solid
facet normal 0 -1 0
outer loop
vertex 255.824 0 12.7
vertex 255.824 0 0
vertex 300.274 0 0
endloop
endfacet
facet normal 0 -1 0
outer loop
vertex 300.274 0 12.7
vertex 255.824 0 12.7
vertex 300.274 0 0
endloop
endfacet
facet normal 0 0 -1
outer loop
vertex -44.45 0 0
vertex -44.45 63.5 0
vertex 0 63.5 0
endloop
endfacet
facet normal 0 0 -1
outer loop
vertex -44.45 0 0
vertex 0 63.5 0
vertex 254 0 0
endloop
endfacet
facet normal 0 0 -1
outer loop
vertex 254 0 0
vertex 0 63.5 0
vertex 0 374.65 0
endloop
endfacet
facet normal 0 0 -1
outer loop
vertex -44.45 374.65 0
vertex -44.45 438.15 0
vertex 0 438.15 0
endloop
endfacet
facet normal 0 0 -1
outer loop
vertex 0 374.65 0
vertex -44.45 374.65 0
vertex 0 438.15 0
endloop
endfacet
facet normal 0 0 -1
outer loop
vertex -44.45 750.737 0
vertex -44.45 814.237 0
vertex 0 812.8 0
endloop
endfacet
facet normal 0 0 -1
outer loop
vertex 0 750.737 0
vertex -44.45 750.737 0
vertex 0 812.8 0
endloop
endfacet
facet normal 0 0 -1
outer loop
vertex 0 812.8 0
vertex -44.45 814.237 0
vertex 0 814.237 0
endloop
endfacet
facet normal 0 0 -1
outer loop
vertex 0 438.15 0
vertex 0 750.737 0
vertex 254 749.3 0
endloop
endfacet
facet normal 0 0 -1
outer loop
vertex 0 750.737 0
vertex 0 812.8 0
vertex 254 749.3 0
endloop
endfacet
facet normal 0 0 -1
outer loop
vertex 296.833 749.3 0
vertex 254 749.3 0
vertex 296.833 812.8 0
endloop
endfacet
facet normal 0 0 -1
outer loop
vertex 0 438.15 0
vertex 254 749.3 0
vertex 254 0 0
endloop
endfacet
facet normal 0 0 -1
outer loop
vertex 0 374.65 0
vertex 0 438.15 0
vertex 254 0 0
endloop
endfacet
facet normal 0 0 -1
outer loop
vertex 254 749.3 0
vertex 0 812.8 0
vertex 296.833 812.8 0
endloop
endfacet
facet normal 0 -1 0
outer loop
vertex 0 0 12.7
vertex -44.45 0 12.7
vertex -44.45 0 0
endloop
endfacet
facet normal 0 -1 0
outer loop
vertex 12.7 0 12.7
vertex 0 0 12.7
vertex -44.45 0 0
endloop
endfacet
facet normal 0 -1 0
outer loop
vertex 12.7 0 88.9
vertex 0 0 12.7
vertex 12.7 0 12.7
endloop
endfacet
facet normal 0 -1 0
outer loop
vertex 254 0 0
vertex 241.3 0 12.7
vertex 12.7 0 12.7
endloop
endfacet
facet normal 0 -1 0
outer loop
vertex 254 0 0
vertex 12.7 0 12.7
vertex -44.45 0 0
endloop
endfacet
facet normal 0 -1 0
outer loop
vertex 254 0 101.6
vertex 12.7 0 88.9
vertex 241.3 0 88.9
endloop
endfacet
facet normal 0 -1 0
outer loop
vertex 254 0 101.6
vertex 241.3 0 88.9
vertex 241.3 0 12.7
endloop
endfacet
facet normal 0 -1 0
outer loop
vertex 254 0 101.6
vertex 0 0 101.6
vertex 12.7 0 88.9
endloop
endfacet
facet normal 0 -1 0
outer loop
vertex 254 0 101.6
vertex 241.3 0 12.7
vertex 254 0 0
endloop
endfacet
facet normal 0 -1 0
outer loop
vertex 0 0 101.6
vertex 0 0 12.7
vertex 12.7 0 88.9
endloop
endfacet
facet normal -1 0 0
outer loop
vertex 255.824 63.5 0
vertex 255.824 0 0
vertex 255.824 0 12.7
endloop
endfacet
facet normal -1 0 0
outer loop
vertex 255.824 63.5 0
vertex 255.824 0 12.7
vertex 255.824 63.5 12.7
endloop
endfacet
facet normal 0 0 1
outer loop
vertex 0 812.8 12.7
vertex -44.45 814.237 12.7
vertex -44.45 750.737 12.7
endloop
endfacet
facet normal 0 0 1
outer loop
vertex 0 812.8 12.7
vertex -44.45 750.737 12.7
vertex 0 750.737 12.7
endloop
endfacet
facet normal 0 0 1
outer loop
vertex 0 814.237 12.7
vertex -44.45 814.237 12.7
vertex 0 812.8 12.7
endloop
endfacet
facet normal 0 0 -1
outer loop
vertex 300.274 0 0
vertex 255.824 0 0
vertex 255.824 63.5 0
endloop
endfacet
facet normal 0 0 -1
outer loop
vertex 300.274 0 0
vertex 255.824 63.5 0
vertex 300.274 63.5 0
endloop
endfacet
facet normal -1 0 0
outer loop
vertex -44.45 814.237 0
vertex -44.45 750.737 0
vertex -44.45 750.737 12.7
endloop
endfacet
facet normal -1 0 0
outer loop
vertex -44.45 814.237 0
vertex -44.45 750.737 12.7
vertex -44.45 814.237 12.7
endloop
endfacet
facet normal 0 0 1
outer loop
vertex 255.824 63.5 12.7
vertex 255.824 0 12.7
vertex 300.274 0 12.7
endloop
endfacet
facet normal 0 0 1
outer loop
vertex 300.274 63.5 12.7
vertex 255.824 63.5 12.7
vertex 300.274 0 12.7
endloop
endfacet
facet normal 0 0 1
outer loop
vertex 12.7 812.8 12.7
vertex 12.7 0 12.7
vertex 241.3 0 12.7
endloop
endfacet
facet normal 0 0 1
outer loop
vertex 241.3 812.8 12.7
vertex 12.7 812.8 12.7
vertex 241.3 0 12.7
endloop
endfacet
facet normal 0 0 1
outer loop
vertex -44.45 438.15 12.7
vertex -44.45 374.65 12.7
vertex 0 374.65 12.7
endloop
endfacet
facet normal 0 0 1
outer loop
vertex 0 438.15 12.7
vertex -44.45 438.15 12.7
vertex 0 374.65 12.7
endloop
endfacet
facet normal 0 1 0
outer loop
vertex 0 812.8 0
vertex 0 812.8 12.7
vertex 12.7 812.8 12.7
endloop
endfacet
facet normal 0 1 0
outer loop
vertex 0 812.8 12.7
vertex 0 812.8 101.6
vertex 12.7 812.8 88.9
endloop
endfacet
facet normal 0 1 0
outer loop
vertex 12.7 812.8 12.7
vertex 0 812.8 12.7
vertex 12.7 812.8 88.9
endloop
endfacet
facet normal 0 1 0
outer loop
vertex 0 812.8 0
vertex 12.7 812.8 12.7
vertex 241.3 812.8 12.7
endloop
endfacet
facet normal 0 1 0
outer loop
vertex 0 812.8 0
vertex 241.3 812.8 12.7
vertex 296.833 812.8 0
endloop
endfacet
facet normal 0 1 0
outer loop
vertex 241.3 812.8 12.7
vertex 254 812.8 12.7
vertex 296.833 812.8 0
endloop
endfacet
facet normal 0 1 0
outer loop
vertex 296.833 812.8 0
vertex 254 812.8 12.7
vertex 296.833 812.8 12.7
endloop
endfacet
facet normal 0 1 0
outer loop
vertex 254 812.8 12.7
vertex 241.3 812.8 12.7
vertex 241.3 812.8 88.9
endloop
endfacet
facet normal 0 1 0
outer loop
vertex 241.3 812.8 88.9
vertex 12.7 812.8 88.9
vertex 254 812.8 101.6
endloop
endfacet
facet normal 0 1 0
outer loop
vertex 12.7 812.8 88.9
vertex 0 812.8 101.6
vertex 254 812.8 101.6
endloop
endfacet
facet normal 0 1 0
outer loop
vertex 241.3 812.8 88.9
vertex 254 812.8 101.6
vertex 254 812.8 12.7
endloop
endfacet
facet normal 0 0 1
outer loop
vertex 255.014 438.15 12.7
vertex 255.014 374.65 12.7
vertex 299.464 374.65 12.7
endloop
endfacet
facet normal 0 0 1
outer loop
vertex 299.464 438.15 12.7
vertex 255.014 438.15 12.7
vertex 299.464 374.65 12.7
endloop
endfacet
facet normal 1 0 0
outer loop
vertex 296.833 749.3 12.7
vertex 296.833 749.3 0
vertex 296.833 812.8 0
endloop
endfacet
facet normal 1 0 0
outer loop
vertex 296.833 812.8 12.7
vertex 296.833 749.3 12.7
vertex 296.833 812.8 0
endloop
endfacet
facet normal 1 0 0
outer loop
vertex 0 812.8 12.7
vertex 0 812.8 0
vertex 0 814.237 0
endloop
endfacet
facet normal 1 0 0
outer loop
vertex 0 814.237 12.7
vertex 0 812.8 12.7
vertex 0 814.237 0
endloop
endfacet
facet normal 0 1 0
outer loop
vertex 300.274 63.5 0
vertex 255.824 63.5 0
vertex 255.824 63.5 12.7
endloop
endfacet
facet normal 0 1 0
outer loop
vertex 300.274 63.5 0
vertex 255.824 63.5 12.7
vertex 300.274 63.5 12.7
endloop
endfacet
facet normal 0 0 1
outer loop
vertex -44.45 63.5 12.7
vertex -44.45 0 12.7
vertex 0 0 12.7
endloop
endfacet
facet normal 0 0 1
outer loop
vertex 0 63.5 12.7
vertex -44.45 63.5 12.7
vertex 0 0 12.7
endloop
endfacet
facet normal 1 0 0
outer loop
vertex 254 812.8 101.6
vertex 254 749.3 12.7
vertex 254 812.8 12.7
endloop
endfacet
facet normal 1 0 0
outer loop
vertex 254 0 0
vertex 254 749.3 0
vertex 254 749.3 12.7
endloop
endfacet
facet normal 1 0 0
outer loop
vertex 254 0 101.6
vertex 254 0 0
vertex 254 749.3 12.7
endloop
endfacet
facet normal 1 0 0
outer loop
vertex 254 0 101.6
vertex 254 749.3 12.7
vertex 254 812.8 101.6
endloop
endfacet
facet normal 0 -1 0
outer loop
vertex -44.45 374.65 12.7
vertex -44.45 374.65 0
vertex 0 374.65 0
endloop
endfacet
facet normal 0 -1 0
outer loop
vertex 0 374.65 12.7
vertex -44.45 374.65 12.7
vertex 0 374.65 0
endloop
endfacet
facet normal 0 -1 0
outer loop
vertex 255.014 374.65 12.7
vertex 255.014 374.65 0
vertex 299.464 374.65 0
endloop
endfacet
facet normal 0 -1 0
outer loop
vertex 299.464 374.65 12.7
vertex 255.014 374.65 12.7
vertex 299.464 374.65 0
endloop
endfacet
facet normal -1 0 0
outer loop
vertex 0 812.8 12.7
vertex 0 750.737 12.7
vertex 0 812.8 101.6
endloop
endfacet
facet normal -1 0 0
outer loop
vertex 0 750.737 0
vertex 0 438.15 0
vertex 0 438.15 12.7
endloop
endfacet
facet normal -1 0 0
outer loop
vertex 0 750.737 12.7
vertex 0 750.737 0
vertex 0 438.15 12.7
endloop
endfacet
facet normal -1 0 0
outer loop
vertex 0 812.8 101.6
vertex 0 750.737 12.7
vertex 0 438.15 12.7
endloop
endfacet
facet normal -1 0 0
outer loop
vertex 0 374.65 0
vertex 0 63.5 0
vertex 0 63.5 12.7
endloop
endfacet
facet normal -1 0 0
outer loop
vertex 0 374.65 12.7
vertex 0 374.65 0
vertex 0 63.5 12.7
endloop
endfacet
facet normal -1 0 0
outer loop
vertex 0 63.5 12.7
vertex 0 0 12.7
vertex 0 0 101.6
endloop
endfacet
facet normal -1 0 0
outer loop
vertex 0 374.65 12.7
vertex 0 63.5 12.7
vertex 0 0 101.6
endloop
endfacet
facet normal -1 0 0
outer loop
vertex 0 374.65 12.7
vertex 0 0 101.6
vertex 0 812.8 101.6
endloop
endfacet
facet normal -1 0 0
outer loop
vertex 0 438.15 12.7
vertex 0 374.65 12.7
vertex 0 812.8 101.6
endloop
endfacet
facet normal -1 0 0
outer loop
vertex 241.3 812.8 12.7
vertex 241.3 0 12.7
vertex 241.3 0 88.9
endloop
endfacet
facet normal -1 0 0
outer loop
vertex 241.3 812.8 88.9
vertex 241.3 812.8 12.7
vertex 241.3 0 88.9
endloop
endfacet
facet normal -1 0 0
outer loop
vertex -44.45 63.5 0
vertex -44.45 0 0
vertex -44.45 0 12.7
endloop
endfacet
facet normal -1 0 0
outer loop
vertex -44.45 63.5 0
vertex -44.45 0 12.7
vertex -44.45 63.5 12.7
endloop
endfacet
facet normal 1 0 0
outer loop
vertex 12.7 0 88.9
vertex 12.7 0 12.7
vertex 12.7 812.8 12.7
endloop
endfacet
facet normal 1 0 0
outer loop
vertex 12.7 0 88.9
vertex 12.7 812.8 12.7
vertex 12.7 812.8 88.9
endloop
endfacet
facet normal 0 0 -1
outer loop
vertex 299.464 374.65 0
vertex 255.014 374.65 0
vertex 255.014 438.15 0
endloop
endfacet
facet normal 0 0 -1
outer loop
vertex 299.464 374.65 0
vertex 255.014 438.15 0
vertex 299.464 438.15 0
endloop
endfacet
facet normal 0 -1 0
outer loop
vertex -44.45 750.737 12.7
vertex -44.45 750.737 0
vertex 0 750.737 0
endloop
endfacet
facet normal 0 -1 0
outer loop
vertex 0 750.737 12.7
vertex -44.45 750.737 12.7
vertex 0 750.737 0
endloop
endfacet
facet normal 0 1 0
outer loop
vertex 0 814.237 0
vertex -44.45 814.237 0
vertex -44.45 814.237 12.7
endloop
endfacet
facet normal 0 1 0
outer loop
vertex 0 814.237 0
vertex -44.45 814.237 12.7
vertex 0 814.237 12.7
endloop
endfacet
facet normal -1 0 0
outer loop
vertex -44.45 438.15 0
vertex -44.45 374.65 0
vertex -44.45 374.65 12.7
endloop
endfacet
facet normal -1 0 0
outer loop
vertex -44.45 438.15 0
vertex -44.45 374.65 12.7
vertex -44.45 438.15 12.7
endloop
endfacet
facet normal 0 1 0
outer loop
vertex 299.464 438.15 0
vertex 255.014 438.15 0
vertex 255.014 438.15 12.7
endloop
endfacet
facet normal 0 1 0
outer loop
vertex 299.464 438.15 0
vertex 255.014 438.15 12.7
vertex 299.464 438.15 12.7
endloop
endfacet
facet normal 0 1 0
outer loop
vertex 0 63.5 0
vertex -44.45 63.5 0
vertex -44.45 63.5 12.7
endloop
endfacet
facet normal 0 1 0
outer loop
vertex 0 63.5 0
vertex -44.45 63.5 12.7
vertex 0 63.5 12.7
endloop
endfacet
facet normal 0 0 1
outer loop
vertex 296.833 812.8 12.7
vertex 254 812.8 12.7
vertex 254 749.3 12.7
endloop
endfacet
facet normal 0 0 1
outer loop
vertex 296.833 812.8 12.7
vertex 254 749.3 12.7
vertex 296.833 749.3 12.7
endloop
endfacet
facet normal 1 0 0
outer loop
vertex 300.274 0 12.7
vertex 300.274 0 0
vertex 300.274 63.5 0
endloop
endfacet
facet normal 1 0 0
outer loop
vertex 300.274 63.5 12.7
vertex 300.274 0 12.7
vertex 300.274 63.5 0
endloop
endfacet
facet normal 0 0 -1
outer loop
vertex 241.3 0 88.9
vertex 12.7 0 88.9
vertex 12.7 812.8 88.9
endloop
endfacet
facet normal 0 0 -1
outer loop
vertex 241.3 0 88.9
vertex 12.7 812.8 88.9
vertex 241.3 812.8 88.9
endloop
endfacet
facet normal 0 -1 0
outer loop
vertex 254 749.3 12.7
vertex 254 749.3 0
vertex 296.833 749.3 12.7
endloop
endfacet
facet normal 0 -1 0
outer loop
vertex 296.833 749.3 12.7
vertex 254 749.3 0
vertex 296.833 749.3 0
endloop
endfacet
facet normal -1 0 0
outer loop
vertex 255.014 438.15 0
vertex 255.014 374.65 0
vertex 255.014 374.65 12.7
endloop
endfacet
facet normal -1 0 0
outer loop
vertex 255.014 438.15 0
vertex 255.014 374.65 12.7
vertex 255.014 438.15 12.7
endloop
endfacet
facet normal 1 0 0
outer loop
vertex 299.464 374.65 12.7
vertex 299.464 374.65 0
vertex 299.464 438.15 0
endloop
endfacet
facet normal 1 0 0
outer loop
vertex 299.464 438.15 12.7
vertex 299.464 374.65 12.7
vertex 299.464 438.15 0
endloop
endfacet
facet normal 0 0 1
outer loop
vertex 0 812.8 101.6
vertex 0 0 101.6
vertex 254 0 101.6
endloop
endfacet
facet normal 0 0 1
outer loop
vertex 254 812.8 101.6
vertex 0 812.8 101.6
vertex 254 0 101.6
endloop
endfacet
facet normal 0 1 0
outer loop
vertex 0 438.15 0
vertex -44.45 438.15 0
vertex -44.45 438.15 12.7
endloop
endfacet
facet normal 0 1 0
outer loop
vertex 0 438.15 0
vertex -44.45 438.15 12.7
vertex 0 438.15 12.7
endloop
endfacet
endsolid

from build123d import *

# Parameters (mm, degrees)
F0_W     = 254
F0_H     = 101.6
F0_W_2   = 228.6
F0_H_2   = 76.2
F1_DEPTH = 812.8
F2_W     = 44.45
F2_H     = 63.5
F3_DEPTH = 12.7


with BuildPart() as f1:
    # F0 (on Front) → F1 (new body)
    with BuildSketch(Plane.XZ):
        with Locations((127, 50.8)):
            Rectangle(F0_W, F0_H)
        with Locations((127, 50.8)):
            Rectangle(F0_W_2, F0_H_2, mode=Mode.SUBTRACT)
    extrude(amount=-F1_DEPTH)

    # F2 (on Top) → F3 (join)
    with BuildSketch(Plane.XY):
        with Locations((-22.225, 782.486833)):
            Rectangle(F2_W, F2_H)
        with Locations((274.607548, 781.05)):
            Rectangle(F2_W, F2_H)
        with Locations((277.239241, 406.4)):
            Rectangle(F2_W, F2_H)
        with Locations((-22.225, 406.4)):
            Rectangle(F2_W, F2_H)
        with Locations((-22.225, 31.75)):
            Rectangle(F2_W, F2_H)
        with Locations((278.048612, 31.75)):
            Rectangle(F2_W, F2_H)
    extrude(amount=F3_DEPTH)


solid = f1.part
